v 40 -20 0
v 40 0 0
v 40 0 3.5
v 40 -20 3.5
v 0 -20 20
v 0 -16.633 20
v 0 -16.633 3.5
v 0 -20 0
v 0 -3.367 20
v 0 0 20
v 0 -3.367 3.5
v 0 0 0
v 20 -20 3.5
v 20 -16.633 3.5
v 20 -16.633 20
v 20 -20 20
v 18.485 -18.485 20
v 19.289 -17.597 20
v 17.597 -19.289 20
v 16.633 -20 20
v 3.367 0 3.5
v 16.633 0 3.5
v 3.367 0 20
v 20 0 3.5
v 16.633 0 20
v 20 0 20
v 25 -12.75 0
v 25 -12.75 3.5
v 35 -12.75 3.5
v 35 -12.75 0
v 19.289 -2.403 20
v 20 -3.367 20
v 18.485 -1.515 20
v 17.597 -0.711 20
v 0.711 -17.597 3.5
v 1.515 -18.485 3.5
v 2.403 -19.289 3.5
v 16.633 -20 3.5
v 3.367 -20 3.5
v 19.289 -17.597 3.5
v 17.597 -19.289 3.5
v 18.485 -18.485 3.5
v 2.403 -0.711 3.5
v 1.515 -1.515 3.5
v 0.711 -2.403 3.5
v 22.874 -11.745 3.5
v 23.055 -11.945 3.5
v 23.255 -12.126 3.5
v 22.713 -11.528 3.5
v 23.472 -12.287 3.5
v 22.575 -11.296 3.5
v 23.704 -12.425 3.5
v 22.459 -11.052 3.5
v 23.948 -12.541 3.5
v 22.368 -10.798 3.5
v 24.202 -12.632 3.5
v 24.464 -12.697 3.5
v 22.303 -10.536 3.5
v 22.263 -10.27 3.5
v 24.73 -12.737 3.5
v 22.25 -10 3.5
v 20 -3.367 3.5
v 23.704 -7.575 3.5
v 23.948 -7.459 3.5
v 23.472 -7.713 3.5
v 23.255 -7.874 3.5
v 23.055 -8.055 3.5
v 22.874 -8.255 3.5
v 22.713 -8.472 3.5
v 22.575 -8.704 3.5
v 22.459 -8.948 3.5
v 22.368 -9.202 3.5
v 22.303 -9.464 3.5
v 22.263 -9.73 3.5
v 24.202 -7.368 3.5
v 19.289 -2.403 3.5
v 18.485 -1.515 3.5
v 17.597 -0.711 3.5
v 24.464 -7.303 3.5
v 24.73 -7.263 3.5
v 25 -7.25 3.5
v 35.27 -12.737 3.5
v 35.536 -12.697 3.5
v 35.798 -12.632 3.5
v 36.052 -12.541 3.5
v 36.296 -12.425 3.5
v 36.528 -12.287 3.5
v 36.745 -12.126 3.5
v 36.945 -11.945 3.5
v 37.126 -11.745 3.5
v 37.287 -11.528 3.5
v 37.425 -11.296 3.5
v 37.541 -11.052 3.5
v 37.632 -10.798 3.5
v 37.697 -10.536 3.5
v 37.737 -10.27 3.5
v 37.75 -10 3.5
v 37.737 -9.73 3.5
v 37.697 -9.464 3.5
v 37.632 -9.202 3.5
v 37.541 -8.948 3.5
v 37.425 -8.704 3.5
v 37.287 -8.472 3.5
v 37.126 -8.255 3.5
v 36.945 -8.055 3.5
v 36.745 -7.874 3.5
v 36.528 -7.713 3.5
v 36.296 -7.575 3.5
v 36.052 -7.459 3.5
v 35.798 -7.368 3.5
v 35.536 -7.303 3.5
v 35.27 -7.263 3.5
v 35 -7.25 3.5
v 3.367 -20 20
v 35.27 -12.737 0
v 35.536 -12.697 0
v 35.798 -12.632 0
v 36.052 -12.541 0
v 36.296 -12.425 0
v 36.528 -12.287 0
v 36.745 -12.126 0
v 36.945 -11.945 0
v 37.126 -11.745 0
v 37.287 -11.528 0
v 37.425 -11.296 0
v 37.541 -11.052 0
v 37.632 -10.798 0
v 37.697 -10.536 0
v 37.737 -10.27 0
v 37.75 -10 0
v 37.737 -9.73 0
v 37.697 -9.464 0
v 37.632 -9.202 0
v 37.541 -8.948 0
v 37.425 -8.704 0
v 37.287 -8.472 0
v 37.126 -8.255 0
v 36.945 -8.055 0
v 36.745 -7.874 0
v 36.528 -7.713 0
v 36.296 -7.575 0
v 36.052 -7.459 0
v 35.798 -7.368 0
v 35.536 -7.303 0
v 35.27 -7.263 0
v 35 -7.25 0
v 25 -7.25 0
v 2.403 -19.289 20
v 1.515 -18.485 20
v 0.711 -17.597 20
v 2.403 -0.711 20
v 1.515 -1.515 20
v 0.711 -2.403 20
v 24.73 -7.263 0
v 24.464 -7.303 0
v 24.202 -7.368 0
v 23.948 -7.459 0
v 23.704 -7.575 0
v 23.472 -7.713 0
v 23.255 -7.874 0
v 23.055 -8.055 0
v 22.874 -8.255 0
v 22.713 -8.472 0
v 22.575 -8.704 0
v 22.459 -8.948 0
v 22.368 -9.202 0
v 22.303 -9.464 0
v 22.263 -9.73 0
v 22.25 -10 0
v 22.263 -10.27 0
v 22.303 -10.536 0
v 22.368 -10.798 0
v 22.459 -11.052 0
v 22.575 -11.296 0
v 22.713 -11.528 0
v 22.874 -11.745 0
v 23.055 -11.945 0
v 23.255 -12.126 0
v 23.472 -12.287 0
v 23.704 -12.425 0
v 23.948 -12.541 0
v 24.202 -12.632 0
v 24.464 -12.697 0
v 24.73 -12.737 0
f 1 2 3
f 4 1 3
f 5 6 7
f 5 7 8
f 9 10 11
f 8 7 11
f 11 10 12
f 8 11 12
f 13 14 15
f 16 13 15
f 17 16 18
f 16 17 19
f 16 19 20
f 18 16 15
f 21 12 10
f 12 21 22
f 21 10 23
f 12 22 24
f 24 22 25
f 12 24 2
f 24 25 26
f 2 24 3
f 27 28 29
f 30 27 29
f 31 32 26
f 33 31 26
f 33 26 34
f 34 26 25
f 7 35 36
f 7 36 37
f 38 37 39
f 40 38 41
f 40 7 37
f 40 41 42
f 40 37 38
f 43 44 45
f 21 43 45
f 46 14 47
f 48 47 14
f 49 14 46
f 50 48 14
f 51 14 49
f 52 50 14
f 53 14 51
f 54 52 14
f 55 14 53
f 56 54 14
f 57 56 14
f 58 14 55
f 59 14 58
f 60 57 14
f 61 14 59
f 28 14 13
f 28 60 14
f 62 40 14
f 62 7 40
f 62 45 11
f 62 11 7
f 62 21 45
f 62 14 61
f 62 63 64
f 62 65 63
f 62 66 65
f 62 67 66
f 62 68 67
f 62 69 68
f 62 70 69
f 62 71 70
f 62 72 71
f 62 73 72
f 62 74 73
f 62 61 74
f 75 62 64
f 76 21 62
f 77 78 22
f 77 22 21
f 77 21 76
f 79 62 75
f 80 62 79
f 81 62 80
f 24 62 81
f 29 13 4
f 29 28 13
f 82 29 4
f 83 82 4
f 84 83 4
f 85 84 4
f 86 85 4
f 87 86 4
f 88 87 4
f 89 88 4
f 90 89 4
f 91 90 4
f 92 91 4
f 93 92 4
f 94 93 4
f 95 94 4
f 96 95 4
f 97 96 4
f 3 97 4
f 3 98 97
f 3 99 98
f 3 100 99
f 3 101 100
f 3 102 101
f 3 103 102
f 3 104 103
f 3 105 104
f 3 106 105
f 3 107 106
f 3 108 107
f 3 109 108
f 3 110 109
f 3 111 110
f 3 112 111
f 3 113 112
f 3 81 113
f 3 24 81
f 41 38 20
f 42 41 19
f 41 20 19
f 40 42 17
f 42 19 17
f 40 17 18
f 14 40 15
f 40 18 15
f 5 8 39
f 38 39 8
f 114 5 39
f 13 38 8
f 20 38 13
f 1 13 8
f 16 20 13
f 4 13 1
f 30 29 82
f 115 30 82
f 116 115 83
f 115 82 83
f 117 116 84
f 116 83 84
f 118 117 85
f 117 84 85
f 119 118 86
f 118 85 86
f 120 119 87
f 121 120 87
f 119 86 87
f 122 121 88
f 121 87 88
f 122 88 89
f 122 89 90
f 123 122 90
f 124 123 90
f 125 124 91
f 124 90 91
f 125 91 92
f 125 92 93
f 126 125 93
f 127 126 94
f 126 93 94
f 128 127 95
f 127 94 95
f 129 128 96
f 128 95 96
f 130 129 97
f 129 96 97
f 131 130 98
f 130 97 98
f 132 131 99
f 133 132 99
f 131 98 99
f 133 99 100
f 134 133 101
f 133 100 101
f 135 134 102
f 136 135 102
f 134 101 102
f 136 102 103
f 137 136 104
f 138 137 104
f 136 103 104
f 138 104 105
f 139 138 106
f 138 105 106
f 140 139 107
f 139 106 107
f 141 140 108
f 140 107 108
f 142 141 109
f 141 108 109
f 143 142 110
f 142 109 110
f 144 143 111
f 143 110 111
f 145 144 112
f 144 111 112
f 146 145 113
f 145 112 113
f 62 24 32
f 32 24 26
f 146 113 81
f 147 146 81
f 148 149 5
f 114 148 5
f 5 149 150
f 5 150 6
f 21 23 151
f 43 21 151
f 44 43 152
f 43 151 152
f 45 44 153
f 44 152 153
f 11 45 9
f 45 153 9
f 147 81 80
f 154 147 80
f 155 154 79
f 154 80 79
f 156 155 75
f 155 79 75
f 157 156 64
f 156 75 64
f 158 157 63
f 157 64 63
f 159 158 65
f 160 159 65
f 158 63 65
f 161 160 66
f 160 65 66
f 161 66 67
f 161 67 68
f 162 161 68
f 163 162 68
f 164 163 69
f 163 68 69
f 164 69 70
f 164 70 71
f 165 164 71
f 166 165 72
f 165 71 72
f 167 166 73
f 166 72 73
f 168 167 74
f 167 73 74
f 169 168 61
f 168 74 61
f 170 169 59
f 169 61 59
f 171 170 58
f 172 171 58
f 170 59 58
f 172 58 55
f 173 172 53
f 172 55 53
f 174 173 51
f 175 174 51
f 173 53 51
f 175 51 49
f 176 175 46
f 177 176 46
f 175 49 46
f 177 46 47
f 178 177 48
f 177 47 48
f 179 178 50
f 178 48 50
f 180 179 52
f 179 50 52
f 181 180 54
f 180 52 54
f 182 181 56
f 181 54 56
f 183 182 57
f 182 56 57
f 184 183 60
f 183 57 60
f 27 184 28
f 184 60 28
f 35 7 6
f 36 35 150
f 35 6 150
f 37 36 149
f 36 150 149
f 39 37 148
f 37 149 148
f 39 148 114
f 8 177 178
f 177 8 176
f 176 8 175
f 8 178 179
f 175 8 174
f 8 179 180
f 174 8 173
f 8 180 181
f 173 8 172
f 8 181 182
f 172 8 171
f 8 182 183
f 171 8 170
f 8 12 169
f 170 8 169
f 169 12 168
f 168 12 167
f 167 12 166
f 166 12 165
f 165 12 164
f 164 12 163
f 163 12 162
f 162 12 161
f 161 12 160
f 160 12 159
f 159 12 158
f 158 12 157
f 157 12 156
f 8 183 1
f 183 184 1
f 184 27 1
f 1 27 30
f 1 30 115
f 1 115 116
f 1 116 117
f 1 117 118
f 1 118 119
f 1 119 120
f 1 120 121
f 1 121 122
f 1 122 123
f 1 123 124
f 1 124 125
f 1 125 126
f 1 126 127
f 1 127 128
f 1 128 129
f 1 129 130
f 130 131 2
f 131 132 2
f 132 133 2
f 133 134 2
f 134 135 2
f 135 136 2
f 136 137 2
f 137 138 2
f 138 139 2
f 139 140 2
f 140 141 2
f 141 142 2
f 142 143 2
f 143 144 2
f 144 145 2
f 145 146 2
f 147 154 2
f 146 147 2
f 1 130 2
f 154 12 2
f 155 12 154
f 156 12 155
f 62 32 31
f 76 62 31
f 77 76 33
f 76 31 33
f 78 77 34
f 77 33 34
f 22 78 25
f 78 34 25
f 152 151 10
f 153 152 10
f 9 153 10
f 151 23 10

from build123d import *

# Parameters (mm, degrees)
F1_DEPTH = 20
F2_R     = 12
F3_DEPTH = 16.5
F5_DEPTH = 3.5


with BuildPart() as f1:
    # F0 (on Front) → F1 (new body)
    with BuildSketch(Plane.XZ):
        Polygon((0, 20), (0, 0), (20, 0), (40, 0), (40, 3.5), (20, 3.5), (20, 20), align=None)
    extrude(amount=F1_DEPTH)

    # F2 (on face) → F3 (cut, through all)
    with BuildSketch(Plane.XY.offset(20)):
        with Locations((10, -10)):
            Circle(F2_R)
    extrude(amount=-F3_DEPTH, mode=Mode.SUBTRACT)

    # F4 (on face) → F5 (cut, through all)
    with BuildSketch(Plane.XY.offset(3.5)):
        with BuildLine():
            Line((30, -12.75), (35, -12.75))
            ThreePointArc((35, -12.75), (37.75, -10), (35, -7.25))
            Line((35, -7.25), (30, -7.25))
            Line((30, -7.25), (25, -7.25))
            ThreePointArc((25, -7.25), (22.25, -10), (25, -12.75))
            Line((25, -12.75), (30, -12.75))
        make_face()
    extrude(amount=-F5_DEPTH, mode=Mode.SUBTRACT)


solid = f1.part
